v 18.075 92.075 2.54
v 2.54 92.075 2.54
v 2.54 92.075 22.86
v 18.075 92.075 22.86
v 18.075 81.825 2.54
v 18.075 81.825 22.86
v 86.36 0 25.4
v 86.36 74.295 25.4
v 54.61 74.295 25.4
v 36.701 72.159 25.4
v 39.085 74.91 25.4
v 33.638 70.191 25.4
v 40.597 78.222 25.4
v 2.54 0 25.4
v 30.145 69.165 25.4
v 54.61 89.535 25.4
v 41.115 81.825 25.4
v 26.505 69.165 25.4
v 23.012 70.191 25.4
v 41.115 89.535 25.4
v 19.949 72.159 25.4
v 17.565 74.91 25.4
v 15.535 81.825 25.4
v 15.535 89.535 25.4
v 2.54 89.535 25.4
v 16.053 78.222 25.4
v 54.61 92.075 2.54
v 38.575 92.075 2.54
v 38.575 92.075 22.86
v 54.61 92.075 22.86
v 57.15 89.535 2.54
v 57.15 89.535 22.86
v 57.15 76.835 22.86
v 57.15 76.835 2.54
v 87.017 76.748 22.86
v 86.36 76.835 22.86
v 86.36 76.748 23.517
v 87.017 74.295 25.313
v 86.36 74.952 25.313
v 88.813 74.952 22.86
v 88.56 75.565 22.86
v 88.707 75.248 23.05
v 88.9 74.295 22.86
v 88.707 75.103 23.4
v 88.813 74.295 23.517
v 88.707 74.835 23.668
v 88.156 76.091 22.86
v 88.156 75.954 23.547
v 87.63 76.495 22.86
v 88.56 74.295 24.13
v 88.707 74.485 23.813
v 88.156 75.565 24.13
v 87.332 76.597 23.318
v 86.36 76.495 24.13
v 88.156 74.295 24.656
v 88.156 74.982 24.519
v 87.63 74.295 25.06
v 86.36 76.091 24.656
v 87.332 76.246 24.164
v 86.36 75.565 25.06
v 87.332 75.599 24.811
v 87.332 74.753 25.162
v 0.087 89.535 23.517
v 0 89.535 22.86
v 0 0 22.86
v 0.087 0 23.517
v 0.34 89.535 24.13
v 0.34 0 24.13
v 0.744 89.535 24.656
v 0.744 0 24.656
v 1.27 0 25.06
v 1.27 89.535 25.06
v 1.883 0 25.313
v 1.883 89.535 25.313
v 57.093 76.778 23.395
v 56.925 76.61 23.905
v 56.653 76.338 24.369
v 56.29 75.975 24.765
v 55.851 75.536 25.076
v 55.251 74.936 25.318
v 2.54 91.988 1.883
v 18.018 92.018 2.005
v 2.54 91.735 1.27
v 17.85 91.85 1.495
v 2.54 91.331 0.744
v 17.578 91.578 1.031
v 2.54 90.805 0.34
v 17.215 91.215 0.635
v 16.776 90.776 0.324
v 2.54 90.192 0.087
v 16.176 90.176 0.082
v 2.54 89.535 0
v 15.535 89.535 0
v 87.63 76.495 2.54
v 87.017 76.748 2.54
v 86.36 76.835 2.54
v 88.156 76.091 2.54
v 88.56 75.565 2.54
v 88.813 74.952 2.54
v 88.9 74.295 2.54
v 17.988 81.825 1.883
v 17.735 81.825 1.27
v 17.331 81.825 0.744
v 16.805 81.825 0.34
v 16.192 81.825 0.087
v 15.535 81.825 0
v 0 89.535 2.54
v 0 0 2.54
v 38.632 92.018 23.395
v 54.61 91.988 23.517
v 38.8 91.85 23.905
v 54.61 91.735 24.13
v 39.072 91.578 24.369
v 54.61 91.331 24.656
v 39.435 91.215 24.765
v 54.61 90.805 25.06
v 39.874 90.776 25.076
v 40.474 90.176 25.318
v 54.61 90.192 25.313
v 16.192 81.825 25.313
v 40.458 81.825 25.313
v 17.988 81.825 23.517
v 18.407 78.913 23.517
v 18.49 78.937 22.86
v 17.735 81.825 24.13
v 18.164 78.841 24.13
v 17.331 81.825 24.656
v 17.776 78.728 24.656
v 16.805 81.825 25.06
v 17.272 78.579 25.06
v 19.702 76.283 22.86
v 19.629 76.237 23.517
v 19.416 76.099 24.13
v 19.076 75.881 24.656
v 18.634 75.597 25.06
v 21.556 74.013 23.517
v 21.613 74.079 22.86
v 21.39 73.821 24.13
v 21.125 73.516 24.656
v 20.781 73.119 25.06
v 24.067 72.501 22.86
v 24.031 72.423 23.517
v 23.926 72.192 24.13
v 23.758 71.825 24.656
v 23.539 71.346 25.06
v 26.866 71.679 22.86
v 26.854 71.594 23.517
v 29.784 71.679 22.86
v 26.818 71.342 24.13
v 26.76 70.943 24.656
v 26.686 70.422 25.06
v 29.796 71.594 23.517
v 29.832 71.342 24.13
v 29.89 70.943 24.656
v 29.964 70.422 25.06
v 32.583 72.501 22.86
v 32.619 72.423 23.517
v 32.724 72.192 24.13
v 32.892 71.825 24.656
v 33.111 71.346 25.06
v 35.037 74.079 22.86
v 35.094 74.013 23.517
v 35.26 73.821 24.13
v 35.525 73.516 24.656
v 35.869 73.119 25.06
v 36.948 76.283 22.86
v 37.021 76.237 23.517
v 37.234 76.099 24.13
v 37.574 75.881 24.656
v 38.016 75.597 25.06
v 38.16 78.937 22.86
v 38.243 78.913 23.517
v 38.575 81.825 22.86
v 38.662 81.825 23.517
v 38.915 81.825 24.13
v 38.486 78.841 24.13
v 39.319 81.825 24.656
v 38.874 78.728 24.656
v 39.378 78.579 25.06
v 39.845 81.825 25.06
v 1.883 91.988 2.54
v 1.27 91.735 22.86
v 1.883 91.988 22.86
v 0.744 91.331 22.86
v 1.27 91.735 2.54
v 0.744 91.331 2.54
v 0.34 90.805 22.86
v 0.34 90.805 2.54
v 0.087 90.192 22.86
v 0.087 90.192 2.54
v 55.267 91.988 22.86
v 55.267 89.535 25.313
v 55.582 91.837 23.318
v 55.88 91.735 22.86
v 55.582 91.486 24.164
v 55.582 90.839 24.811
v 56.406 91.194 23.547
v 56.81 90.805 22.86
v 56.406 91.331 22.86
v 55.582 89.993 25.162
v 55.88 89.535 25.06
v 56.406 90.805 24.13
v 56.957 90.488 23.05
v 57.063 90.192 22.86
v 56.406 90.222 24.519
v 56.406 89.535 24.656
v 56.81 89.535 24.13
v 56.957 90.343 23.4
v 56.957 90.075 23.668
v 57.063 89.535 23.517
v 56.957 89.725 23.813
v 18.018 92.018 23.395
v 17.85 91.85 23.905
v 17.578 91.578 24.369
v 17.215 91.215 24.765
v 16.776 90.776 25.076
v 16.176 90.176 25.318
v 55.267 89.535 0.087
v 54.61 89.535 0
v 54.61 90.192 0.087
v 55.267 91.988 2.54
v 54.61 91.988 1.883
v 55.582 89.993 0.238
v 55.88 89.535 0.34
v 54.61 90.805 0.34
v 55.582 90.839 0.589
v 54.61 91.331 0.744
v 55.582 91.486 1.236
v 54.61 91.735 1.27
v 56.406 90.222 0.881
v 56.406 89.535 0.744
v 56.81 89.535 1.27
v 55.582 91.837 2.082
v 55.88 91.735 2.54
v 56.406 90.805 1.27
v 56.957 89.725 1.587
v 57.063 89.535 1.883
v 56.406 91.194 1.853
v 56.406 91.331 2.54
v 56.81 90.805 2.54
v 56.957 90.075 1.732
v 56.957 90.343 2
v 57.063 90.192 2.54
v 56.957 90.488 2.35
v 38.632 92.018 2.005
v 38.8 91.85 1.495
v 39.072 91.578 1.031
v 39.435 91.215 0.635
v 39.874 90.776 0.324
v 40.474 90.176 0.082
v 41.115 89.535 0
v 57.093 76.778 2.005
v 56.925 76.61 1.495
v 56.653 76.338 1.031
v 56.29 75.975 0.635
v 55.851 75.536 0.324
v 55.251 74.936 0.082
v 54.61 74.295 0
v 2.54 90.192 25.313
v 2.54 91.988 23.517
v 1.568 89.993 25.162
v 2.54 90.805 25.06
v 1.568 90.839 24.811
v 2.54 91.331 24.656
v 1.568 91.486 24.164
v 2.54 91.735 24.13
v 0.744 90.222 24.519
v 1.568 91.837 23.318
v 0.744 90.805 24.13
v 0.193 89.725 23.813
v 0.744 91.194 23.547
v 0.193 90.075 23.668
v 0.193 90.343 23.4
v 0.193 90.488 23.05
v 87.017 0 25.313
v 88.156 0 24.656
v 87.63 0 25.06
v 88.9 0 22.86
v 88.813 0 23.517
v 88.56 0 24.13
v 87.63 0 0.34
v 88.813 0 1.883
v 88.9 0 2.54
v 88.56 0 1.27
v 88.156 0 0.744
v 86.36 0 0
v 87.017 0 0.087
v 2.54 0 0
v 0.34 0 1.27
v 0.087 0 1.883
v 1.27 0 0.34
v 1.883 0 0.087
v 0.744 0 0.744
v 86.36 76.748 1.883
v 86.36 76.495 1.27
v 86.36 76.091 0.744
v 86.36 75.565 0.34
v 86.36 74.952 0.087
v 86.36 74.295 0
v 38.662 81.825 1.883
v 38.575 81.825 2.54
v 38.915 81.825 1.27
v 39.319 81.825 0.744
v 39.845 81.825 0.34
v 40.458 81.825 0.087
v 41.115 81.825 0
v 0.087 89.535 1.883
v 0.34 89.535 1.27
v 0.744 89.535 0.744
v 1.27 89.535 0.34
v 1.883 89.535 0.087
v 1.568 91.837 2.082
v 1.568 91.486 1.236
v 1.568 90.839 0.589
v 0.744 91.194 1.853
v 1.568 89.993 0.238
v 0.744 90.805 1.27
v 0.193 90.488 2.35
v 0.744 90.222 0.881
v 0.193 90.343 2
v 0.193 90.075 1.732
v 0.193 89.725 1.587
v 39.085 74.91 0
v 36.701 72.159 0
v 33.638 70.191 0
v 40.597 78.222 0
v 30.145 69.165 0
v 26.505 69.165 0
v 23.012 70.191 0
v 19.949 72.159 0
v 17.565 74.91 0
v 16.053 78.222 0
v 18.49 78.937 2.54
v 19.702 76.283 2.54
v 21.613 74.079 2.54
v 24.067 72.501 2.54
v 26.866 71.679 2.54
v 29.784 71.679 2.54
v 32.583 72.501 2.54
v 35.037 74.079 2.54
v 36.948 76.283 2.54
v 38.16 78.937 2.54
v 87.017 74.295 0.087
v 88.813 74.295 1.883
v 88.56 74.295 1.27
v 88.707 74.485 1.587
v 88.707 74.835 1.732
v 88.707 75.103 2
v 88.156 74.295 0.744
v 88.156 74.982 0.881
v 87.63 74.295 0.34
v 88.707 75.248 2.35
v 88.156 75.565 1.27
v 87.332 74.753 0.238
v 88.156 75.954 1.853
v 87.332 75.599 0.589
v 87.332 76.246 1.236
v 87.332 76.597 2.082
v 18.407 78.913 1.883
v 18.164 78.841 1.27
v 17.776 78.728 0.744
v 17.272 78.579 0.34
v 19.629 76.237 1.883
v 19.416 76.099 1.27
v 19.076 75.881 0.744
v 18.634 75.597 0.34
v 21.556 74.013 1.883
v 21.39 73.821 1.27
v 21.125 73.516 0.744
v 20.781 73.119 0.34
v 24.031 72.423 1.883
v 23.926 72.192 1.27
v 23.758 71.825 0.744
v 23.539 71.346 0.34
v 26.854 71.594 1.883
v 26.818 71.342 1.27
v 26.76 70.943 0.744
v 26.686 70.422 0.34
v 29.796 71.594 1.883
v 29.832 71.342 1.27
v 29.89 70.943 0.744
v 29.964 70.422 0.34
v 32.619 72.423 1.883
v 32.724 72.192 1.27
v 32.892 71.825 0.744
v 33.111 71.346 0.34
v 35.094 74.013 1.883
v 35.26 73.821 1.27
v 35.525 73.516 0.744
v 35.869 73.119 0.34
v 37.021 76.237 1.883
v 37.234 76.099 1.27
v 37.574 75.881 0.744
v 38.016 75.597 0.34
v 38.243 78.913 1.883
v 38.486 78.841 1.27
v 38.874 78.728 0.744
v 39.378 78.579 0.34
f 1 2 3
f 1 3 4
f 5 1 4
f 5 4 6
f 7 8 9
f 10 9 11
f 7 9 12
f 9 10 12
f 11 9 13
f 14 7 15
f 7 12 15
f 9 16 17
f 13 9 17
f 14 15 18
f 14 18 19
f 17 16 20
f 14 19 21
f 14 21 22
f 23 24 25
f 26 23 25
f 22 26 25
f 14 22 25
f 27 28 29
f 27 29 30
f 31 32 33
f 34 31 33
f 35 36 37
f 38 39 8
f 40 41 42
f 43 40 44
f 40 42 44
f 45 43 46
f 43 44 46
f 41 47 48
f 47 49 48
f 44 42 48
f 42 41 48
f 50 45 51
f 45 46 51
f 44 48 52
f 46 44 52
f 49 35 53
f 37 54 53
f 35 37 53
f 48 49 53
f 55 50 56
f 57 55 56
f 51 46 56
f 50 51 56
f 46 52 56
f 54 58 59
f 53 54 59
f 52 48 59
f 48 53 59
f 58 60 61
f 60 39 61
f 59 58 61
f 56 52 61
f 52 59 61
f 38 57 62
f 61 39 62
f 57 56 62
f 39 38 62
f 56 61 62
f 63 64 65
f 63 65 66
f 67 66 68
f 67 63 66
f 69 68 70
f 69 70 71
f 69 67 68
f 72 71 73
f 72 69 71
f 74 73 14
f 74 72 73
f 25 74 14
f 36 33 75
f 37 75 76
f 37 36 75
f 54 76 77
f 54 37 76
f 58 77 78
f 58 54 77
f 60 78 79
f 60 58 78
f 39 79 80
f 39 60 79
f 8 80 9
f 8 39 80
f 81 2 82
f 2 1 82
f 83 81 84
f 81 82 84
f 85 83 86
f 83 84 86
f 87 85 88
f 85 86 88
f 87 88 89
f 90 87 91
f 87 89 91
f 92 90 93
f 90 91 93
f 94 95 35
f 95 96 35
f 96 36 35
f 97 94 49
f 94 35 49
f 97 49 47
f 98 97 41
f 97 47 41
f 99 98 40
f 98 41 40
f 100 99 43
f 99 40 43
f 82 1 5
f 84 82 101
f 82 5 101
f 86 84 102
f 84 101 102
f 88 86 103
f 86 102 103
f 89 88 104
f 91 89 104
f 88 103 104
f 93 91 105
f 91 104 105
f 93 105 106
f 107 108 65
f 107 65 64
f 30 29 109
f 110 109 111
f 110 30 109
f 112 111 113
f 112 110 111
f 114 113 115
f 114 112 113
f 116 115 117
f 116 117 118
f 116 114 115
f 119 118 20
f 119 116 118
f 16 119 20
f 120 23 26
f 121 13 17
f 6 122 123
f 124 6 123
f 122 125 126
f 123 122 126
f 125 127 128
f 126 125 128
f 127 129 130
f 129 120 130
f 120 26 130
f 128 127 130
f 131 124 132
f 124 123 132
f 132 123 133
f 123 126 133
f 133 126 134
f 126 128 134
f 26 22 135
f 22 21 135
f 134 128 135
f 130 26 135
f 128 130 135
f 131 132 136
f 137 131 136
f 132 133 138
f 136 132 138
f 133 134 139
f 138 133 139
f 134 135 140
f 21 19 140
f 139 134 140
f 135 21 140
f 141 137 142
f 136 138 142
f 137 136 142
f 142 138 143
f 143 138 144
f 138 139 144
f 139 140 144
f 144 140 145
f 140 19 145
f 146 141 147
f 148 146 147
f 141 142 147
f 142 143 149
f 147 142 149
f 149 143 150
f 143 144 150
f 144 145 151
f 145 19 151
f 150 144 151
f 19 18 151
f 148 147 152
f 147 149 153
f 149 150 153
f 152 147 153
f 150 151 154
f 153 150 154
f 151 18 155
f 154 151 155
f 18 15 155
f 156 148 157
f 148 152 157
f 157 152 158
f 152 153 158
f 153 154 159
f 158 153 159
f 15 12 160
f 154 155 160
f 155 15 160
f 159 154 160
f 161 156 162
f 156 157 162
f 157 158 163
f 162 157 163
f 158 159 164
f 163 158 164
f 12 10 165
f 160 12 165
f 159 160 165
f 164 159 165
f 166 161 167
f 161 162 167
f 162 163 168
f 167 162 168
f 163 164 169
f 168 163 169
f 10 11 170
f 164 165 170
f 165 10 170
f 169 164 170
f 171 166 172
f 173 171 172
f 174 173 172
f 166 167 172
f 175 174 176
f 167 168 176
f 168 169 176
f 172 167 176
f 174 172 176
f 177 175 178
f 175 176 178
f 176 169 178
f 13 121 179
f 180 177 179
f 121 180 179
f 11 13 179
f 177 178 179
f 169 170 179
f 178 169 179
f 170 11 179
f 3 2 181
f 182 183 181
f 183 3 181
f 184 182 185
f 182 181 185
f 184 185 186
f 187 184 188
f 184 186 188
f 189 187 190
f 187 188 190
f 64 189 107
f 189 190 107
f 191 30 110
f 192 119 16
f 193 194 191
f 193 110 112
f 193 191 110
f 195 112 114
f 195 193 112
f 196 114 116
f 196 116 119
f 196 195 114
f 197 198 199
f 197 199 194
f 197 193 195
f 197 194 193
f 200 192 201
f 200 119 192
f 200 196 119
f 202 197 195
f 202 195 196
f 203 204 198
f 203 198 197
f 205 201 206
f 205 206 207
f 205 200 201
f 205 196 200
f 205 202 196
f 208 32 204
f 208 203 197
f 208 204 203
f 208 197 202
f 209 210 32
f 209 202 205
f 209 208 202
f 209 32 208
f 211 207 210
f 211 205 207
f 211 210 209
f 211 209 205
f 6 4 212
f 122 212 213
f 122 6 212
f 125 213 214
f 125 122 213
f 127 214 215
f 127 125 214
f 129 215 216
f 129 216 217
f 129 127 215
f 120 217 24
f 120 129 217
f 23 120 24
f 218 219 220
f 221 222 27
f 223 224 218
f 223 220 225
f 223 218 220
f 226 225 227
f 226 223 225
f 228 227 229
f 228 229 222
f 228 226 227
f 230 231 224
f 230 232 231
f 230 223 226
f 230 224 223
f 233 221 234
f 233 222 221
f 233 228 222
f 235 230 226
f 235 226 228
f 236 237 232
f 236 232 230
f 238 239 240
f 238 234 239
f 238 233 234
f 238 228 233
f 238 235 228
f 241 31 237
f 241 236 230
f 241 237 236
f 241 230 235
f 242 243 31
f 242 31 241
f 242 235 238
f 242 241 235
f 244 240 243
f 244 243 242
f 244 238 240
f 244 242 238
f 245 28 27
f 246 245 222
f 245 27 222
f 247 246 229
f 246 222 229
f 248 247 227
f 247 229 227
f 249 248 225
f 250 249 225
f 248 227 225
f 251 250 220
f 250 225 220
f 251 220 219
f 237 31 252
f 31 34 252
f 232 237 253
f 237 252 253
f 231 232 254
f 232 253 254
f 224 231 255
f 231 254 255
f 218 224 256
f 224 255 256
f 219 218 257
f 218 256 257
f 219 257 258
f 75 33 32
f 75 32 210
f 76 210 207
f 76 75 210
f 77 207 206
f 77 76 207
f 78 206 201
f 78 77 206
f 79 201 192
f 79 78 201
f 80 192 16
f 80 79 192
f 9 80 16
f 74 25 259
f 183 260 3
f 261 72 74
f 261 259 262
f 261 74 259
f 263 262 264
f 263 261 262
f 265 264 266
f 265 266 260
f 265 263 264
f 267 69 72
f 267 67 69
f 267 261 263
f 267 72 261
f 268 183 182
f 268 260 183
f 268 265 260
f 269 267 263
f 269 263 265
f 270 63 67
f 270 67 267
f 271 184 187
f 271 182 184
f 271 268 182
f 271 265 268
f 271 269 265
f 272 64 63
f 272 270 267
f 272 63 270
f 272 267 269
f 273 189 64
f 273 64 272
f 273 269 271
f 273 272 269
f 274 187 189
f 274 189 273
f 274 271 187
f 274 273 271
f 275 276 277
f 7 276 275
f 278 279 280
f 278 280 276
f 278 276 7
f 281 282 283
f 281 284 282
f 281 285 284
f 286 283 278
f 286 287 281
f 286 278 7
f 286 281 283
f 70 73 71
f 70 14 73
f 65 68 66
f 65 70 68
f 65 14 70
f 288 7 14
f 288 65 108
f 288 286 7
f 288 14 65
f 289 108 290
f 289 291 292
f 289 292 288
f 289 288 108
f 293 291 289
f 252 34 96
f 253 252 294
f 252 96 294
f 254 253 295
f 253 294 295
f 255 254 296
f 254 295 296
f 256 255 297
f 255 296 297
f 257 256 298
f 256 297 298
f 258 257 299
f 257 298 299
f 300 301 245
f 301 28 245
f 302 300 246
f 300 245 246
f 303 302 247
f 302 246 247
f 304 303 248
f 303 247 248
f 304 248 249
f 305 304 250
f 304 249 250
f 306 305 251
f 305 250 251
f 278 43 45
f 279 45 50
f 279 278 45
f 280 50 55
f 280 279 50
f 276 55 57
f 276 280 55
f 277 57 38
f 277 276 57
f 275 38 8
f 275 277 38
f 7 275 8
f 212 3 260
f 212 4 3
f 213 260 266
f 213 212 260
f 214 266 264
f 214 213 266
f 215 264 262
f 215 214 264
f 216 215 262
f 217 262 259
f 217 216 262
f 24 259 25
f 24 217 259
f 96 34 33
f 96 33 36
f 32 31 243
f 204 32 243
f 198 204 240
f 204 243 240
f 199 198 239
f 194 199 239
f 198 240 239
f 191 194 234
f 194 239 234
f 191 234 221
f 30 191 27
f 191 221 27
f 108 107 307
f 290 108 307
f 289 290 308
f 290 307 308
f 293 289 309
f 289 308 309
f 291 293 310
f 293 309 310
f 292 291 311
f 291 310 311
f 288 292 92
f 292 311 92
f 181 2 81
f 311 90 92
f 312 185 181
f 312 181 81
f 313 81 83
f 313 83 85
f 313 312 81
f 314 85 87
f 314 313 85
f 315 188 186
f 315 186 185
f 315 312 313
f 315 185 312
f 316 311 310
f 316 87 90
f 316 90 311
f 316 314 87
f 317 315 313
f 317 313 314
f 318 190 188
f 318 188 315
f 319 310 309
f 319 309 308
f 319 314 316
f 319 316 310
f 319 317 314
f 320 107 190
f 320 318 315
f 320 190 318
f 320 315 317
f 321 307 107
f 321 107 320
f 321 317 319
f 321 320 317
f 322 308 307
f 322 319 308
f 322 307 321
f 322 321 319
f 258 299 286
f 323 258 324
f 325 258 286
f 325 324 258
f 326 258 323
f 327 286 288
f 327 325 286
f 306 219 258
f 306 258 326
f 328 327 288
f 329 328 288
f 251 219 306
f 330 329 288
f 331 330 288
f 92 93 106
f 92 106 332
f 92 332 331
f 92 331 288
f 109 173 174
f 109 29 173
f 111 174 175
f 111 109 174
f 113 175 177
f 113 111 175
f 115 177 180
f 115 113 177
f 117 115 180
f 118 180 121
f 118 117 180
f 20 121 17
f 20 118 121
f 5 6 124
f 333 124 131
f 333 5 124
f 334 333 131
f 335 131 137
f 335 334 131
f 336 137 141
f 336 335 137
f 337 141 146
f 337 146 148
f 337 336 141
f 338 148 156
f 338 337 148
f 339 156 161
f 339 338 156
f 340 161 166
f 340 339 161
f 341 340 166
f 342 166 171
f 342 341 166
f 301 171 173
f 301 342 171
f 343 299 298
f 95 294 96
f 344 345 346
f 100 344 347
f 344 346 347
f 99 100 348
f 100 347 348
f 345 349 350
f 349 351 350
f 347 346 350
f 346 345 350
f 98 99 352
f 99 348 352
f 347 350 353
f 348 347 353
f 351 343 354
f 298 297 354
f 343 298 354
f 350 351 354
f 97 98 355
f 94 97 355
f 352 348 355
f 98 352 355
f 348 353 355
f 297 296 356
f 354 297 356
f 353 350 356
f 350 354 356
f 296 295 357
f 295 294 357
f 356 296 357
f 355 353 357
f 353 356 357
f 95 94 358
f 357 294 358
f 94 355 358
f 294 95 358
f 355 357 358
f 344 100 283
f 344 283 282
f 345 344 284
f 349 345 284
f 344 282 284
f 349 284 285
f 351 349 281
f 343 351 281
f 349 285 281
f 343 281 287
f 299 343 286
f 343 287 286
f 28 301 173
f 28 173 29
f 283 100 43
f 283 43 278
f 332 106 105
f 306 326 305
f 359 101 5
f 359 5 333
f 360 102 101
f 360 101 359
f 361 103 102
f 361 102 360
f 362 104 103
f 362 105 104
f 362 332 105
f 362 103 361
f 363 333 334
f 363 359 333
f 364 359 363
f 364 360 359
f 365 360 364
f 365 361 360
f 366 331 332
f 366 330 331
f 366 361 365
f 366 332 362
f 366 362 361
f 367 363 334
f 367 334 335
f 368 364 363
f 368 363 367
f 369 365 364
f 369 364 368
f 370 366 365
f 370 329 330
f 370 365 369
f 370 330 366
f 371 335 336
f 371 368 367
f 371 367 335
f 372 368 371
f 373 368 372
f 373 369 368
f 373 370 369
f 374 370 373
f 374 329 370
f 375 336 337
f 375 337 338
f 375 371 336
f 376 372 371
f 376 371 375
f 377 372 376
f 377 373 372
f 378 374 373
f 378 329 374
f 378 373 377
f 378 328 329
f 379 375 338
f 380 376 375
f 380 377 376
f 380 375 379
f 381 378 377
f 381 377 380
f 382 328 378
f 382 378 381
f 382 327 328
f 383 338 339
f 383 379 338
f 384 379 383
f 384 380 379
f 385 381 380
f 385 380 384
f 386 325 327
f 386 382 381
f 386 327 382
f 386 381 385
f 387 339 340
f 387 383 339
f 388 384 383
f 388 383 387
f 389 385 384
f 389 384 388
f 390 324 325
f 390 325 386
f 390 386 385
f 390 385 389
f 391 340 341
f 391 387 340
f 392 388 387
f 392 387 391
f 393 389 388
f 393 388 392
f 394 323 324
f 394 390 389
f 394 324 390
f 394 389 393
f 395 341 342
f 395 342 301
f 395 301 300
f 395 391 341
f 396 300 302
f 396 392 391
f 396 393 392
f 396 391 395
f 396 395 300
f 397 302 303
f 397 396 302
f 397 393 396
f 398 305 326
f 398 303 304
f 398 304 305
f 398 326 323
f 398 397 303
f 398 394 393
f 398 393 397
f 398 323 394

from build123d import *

# Parameters (mm, degrees)
BOSS_EXTRUDE1_DEPTH = 25.4
FILLET4_R           = 2.54
FILLET5_R           = 2.54


with BuildPart() as part:
    # Sketch2 → Boss-Extrude1 (new body)
    with BuildSketch(Plane.XY):
        with BuildLine():
            Line((0, 0), (0, 92.075))
            Line((0, 92.075), (18.075, 92.075))
            Line((18.075, 92.075), (18.075, 81.825))
            ThreePointArc((18.075, 81.825), (28.325, 71.575), (38.575, 81.825))
            Line((38.575, 81.825), (38.575, 92.075))
            Line((38.575, 92.075), (57.15, 92.075))
            Line((57.15, 92.075), (57.15, 76.835))
            Line((57.15, 76.835), (88.9, 76.835))
            Line((88.9, 76.835), (88.9, 0))
            Line((88.9, 0), (0, 0))
        make_face()
    extrude(amount=BOSS_EXTRUDE1_DEPTH)

    # Fillet4
    fillet4_edges = [part.edges().sort_by_distance(p)[0] for p in [
        (0, 46.0375, 0),
        (9.0375, 92.075, 0),
        (18.075, 86.95, 0),
        (28.325, 71.575, 0),
        (38.575, 86.95, 0),
        (47.8625, 92.075, 0),
        (57.15, 84.455, 0),
        (73.025, 76.835, 25.4),
        (73.025, 76.835, 0),
        (88.9, 38.4175, 0),
        (57.15, 84.455, 25.4),
        (88.9, 76.835, 12.7),
        (47.8625, 92.075, 25.4),
        (38.575, 86.95, 25.4),
        (28.325, 71.575, 25.4),
        (18.075, 86.95, 25.4),
        (9.0375, 92.075, 25.4),
        (0, 46.0375, 25.4),
        (88.9, 38.4175, 25.4),
    ]]
    fillet(fillet4_edges, radius=FILLET4_R)

    # Fillet5
    # the kernel refuses this fillet: 2.54 mm, written as the material it takes off along each edge
    with BuildSketch(Plane(origin=(2.54, 89.535, 22.86), x_dir=(0, 1, 0), z_dir=(-1, 0, 0))) as fillet5_piece_1_section:
        Polygon((0, 0), (FILLET5_R, 0), (FILLET5_R, -FILLET5_R), (0, -FILLET5_R), align=None)
    fillet5_piece_1 = extrude(amount=FILLET5_R, mode=Mode.PRIVATE)
    fillet5_piece_1 = fillet5_piece_1 - Plane(origin=(2.54, 89.535, 22.86), x_dir=(0, -0.7071067811865475, -0.7071067811865475), z_dir=(-1, 0, 0)) * Sphere(FILLET5_R, mode=Mode.PRIVATE)
    add(fillet5_piece_1, mode=Mode.SUBTRACT)
    with BuildSketch(Plane(origin=(54.61, 89.535, 22.86), x_dir=(0, 1, 0), z_dir=(1, 0, 0))) as fillet5_piece_2_section:
        Polygon((0, 0), (FILLET5_R, 0), (FILLET5_R, FILLET5_R), (0, FILLET5_R), align=None)
    fillet5_piece_2 = extrude(amount=FILLET5_R, mode=Mode.PRIVATE)
    fillet5_piece_2 = fillet5_piece_2 - Plane(origin=(54.61, 89.535, 22.86), x_dir=(0, -0.7071067811865475, -0.7071067811865475), z_dir=(1, 0, 0)) * Sphere(FILLET5_R, mode=Mode.PRIVATE)
    add(fillet5_piece_2, mode=Mode.SUBTRACT)
    with BuildSketch(Plane(origin=(2.54, 89.535, 2.54), x_dir=(0, 1, 0), z_dir=(-1, 0, 0))) as fillet5_piece_3_section:
        Polygon((0, 0), (FILLET5_R, 0), (FILLET5_R, FILLET5_R), (0, FILLET5_R), align=None)
    fillet5_piece_3 = extrude(amount=FILLET5_R, mode=Mode.PRIVATE)
    fillet5_piece_3 = fillet5_piece_3 - Plane(origin=(2.54, 89.535, 2.54), x_dir=(0, -0.7071067811865475, 0.7071067811865475), z_dir=(-1, 0, 0)) * Sphere(FILLET5_R, mode=Mode.PRIVATE)
    add(fillet5_piece_3, mode=Mode.SUBTRACT)
    with BuildSketch(Plane(origin=(54.61, 89.535, 2.54), x_dir=(0, 1, 0), z_dir=(1, 0, 0))) as fillet5_piece_4_section:
        Polygon((0, 0), (FILLET5_R, 0), (FILLET5_R, -FILLET5_R), (0, -FILLET5_R), align=None)
    fillet5_piece_4 = extrude(amount=FILLET5_R, mode=Mode.PRIVATE)
    fillet5_piece_4 = fillet5_piece_4 - Plane(origin=(54.61, 89.535, 2.54), x_dir=(0, -0.7071067811865475, 0.7071067811865475), z_dir=(1, 0, 0)) * Sphere(FILLET5_R, mode=Mode.PRIVATE)
    add(fillet5_piece_4, mode=Mode.SUBTRACT)
    with BuildSketch(Plane(origin=(0, 92.075, 2.54), x_dir=(0, -1, 0), z_dir=(0, 0, 1))) as fillet5_piece_5:
        with BuildLine():
            CenterArc((FILLET5_R, FILLET5_R), FILLET5_R, 180, 90)
            Line((0, FILLET5_R), (0, 0))
            Line((0, 0), (FILLET5_R, 0))
        make_face()
    extrude(amount=20.32, mode=Mode.SUBTRACT)
    with BuildSketch(Plane(origin=(57.15, 92.075, 2.54), x_dir=(0, -1, 0), z_dir=(0, 0, 1))) as fillet5_piece_6:
        with BuildLine():
            CenterArc((FILLET5_R, -FILLET5_R), FILLET5_R, 90, 90)
            Line((0, -FILLET5_R), (0, 0))
            Line((0, 0), (FILLET5_R, 0))
        make_face()
    extrude(amount=20.32, mode=Mode.SUBTRACT)


solid = part.part
